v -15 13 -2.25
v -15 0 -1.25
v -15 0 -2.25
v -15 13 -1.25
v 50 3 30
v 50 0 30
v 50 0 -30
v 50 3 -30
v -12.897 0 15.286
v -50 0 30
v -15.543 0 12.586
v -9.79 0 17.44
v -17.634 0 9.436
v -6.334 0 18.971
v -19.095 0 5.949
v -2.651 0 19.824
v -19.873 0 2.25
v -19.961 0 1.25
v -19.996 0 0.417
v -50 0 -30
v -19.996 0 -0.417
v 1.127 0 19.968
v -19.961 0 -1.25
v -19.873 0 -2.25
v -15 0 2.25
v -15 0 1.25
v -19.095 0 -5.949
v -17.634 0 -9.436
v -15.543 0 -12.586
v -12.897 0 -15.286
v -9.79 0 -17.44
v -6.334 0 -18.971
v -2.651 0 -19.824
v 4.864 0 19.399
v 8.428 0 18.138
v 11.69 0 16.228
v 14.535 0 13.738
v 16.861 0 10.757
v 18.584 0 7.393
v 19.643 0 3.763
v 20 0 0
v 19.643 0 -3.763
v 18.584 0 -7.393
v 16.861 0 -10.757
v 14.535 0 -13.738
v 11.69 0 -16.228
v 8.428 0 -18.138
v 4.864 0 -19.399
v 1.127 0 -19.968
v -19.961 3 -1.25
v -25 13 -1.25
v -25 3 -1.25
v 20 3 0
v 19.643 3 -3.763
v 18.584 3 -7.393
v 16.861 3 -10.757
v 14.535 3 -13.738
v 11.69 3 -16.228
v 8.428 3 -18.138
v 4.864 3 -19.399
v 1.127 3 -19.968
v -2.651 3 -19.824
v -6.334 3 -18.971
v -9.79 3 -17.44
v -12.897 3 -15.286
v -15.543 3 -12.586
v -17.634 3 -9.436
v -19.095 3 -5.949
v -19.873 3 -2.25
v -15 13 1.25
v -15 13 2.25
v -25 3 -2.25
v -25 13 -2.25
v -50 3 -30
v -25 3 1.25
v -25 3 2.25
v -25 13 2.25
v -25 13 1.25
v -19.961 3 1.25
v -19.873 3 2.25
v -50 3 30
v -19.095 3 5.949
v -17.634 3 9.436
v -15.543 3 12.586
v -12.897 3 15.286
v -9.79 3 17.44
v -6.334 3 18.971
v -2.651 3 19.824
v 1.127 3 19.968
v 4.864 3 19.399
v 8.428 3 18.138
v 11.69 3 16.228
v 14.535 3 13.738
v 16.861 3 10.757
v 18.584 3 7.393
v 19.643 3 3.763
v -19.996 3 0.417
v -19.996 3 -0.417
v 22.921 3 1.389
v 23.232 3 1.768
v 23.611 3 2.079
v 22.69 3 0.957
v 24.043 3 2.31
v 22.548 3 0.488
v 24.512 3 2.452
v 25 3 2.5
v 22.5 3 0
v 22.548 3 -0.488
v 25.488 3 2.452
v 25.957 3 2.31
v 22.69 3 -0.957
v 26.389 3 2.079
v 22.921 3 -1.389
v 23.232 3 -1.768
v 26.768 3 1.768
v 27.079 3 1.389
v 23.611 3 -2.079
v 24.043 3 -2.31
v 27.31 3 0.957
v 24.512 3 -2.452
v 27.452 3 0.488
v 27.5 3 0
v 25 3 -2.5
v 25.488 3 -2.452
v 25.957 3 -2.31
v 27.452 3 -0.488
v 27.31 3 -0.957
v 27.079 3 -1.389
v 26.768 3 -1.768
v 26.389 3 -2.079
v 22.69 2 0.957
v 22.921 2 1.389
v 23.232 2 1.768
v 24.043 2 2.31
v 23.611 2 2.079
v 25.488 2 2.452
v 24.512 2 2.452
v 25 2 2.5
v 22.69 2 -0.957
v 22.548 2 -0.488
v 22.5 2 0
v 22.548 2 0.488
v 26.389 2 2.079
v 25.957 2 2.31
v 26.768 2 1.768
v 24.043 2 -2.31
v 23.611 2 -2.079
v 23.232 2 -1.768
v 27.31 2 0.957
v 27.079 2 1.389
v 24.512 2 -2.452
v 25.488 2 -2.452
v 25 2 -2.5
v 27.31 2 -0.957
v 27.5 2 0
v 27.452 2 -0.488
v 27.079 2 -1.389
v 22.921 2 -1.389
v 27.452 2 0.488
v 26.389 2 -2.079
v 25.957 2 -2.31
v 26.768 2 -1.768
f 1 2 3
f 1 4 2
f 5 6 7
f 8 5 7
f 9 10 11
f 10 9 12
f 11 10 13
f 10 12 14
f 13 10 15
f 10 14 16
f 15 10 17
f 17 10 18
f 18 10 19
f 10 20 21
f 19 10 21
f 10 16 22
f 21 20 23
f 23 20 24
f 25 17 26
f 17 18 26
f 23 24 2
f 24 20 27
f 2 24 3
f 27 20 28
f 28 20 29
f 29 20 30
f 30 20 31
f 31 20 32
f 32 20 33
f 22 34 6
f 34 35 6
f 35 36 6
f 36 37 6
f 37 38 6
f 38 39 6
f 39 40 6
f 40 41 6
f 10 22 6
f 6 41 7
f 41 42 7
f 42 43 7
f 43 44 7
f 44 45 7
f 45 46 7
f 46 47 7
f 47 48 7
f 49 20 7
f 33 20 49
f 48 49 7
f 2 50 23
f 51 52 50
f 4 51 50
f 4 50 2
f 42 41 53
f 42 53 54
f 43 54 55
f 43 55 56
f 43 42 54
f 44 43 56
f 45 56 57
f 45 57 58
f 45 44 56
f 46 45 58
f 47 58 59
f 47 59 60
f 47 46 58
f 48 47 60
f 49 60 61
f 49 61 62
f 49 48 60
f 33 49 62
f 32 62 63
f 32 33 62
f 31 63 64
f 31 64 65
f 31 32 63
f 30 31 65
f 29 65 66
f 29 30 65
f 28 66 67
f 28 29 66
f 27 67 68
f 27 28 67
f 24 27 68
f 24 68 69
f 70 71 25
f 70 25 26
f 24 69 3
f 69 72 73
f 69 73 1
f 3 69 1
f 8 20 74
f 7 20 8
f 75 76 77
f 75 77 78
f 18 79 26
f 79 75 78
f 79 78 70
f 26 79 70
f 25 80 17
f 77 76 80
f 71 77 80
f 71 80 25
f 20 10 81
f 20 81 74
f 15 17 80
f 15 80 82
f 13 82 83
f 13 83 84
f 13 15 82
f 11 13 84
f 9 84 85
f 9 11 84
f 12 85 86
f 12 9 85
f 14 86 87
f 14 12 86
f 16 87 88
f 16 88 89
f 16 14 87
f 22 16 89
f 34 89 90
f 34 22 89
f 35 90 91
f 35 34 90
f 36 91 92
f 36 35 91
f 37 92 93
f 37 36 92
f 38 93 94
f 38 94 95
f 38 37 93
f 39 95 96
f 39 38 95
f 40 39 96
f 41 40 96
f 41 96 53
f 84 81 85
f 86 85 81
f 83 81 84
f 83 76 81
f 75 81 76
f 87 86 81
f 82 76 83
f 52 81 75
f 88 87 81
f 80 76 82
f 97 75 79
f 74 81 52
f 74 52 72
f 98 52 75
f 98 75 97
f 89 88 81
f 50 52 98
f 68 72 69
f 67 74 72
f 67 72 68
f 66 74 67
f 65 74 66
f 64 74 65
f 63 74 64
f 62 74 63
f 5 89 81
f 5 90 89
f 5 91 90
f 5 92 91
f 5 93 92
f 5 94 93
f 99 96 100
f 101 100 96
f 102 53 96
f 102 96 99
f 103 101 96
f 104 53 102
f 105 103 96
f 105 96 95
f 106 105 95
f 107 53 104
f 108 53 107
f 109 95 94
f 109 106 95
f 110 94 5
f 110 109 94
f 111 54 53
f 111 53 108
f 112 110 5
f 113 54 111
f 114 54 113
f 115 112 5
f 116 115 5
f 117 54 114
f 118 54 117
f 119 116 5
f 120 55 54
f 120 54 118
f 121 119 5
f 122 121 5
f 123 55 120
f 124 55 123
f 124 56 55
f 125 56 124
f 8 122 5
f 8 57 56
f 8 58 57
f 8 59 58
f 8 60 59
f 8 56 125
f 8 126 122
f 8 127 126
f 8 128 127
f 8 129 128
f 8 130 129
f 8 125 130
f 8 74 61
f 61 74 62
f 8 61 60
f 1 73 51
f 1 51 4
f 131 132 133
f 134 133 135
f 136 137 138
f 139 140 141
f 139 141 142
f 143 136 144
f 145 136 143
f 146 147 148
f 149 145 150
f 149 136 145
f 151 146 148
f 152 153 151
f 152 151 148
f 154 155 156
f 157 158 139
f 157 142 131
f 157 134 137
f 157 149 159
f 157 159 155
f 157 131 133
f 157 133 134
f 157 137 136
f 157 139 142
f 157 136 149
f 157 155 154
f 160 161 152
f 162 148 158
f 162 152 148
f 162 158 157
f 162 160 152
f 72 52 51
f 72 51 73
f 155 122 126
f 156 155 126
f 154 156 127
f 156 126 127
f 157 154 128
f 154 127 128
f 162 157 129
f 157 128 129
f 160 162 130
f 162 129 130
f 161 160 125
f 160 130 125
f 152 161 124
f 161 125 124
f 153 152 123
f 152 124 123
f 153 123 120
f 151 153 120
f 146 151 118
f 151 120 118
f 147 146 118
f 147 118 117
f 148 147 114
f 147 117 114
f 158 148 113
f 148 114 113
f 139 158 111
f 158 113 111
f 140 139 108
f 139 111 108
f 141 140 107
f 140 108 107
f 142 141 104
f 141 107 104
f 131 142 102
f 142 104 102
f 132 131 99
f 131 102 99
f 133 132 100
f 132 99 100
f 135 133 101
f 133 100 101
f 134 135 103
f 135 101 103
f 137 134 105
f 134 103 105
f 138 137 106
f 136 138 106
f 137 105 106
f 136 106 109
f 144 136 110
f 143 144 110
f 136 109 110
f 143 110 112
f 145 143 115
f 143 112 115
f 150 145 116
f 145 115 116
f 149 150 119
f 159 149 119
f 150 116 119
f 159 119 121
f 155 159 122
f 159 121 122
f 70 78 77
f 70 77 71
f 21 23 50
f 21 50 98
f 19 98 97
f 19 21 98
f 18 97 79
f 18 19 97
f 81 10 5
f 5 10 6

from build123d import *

# Parameters (mm, degrees)
CROQUIS1_W                   = 100
CROQUIS1_H                   = 60
CROQUIS1_R                   = 20
SALIENTE_EXTRUIR1_DEPTH      = 3
CROQUIS2_W                   = 10
CROQUIS2_H                   = 1
SALIENTE_EXTRUIR2_DEPTH      = 10
SALIENTE_EXTRUIR2_DEPTH_BACK = 3
CROQUIS3_R                   = 2.5
CORTAR_EXTRUIR1_DEPTH        = 1


with BuildPart() as part:
    # Croquis1 → Saliente-Extruir1 (new body)
    with BuildSketch(Plane(origin=(0, 0, 0), x_dir=(1, 0, 0), z_dir=(0, 1, 0))):
        Rectangle(CROQUIS1_W, CROQUIS1_H)
        Circle(CROQUIS1_R, mode=Mode.SUBTRACT)
    extrude(amount=SALIENTE_EXTRUIR1_DEPTH)

    # Croquis2 → Saliente-Extruir2 (add, two sides)
    with BuildSketch(Plane(origin=(0, 3, 0), x_dir=(1, 0, 0), z_dir=(0, 1, 0))) as saliente_extruir2_sk:
        with Locations((-20, 1.75)):
            Rectangle(CROQUIS2_W, CROQUIS2_H)
        with Locations((-20, -1.75)):
            Rectangle(CROQUIS2_W, CROQUIS2_H)
    extrude(amount=SALIENTE_EXTRUIR2_DEPTH)
    extrude(saliente_extruir2_sk.sketch, amount=-SALIENTE_EXTRUIR2_DEPTH_BACK)

    # Croquis3 → Cortar-Extruir1 (cut)
    with BuildSketch(Plane(origin=(0, 3, 0), x_dir=(1, 0, 0), z_dir=(0, 1, 0))):
        with Locations((25, 0)):
            Circle(CROQUIS3_R)
    extrude(amount=-CORTAR_EXTRUIR1_DEPTH, mode=Mode.SUBTRACT)


solid = part.part
